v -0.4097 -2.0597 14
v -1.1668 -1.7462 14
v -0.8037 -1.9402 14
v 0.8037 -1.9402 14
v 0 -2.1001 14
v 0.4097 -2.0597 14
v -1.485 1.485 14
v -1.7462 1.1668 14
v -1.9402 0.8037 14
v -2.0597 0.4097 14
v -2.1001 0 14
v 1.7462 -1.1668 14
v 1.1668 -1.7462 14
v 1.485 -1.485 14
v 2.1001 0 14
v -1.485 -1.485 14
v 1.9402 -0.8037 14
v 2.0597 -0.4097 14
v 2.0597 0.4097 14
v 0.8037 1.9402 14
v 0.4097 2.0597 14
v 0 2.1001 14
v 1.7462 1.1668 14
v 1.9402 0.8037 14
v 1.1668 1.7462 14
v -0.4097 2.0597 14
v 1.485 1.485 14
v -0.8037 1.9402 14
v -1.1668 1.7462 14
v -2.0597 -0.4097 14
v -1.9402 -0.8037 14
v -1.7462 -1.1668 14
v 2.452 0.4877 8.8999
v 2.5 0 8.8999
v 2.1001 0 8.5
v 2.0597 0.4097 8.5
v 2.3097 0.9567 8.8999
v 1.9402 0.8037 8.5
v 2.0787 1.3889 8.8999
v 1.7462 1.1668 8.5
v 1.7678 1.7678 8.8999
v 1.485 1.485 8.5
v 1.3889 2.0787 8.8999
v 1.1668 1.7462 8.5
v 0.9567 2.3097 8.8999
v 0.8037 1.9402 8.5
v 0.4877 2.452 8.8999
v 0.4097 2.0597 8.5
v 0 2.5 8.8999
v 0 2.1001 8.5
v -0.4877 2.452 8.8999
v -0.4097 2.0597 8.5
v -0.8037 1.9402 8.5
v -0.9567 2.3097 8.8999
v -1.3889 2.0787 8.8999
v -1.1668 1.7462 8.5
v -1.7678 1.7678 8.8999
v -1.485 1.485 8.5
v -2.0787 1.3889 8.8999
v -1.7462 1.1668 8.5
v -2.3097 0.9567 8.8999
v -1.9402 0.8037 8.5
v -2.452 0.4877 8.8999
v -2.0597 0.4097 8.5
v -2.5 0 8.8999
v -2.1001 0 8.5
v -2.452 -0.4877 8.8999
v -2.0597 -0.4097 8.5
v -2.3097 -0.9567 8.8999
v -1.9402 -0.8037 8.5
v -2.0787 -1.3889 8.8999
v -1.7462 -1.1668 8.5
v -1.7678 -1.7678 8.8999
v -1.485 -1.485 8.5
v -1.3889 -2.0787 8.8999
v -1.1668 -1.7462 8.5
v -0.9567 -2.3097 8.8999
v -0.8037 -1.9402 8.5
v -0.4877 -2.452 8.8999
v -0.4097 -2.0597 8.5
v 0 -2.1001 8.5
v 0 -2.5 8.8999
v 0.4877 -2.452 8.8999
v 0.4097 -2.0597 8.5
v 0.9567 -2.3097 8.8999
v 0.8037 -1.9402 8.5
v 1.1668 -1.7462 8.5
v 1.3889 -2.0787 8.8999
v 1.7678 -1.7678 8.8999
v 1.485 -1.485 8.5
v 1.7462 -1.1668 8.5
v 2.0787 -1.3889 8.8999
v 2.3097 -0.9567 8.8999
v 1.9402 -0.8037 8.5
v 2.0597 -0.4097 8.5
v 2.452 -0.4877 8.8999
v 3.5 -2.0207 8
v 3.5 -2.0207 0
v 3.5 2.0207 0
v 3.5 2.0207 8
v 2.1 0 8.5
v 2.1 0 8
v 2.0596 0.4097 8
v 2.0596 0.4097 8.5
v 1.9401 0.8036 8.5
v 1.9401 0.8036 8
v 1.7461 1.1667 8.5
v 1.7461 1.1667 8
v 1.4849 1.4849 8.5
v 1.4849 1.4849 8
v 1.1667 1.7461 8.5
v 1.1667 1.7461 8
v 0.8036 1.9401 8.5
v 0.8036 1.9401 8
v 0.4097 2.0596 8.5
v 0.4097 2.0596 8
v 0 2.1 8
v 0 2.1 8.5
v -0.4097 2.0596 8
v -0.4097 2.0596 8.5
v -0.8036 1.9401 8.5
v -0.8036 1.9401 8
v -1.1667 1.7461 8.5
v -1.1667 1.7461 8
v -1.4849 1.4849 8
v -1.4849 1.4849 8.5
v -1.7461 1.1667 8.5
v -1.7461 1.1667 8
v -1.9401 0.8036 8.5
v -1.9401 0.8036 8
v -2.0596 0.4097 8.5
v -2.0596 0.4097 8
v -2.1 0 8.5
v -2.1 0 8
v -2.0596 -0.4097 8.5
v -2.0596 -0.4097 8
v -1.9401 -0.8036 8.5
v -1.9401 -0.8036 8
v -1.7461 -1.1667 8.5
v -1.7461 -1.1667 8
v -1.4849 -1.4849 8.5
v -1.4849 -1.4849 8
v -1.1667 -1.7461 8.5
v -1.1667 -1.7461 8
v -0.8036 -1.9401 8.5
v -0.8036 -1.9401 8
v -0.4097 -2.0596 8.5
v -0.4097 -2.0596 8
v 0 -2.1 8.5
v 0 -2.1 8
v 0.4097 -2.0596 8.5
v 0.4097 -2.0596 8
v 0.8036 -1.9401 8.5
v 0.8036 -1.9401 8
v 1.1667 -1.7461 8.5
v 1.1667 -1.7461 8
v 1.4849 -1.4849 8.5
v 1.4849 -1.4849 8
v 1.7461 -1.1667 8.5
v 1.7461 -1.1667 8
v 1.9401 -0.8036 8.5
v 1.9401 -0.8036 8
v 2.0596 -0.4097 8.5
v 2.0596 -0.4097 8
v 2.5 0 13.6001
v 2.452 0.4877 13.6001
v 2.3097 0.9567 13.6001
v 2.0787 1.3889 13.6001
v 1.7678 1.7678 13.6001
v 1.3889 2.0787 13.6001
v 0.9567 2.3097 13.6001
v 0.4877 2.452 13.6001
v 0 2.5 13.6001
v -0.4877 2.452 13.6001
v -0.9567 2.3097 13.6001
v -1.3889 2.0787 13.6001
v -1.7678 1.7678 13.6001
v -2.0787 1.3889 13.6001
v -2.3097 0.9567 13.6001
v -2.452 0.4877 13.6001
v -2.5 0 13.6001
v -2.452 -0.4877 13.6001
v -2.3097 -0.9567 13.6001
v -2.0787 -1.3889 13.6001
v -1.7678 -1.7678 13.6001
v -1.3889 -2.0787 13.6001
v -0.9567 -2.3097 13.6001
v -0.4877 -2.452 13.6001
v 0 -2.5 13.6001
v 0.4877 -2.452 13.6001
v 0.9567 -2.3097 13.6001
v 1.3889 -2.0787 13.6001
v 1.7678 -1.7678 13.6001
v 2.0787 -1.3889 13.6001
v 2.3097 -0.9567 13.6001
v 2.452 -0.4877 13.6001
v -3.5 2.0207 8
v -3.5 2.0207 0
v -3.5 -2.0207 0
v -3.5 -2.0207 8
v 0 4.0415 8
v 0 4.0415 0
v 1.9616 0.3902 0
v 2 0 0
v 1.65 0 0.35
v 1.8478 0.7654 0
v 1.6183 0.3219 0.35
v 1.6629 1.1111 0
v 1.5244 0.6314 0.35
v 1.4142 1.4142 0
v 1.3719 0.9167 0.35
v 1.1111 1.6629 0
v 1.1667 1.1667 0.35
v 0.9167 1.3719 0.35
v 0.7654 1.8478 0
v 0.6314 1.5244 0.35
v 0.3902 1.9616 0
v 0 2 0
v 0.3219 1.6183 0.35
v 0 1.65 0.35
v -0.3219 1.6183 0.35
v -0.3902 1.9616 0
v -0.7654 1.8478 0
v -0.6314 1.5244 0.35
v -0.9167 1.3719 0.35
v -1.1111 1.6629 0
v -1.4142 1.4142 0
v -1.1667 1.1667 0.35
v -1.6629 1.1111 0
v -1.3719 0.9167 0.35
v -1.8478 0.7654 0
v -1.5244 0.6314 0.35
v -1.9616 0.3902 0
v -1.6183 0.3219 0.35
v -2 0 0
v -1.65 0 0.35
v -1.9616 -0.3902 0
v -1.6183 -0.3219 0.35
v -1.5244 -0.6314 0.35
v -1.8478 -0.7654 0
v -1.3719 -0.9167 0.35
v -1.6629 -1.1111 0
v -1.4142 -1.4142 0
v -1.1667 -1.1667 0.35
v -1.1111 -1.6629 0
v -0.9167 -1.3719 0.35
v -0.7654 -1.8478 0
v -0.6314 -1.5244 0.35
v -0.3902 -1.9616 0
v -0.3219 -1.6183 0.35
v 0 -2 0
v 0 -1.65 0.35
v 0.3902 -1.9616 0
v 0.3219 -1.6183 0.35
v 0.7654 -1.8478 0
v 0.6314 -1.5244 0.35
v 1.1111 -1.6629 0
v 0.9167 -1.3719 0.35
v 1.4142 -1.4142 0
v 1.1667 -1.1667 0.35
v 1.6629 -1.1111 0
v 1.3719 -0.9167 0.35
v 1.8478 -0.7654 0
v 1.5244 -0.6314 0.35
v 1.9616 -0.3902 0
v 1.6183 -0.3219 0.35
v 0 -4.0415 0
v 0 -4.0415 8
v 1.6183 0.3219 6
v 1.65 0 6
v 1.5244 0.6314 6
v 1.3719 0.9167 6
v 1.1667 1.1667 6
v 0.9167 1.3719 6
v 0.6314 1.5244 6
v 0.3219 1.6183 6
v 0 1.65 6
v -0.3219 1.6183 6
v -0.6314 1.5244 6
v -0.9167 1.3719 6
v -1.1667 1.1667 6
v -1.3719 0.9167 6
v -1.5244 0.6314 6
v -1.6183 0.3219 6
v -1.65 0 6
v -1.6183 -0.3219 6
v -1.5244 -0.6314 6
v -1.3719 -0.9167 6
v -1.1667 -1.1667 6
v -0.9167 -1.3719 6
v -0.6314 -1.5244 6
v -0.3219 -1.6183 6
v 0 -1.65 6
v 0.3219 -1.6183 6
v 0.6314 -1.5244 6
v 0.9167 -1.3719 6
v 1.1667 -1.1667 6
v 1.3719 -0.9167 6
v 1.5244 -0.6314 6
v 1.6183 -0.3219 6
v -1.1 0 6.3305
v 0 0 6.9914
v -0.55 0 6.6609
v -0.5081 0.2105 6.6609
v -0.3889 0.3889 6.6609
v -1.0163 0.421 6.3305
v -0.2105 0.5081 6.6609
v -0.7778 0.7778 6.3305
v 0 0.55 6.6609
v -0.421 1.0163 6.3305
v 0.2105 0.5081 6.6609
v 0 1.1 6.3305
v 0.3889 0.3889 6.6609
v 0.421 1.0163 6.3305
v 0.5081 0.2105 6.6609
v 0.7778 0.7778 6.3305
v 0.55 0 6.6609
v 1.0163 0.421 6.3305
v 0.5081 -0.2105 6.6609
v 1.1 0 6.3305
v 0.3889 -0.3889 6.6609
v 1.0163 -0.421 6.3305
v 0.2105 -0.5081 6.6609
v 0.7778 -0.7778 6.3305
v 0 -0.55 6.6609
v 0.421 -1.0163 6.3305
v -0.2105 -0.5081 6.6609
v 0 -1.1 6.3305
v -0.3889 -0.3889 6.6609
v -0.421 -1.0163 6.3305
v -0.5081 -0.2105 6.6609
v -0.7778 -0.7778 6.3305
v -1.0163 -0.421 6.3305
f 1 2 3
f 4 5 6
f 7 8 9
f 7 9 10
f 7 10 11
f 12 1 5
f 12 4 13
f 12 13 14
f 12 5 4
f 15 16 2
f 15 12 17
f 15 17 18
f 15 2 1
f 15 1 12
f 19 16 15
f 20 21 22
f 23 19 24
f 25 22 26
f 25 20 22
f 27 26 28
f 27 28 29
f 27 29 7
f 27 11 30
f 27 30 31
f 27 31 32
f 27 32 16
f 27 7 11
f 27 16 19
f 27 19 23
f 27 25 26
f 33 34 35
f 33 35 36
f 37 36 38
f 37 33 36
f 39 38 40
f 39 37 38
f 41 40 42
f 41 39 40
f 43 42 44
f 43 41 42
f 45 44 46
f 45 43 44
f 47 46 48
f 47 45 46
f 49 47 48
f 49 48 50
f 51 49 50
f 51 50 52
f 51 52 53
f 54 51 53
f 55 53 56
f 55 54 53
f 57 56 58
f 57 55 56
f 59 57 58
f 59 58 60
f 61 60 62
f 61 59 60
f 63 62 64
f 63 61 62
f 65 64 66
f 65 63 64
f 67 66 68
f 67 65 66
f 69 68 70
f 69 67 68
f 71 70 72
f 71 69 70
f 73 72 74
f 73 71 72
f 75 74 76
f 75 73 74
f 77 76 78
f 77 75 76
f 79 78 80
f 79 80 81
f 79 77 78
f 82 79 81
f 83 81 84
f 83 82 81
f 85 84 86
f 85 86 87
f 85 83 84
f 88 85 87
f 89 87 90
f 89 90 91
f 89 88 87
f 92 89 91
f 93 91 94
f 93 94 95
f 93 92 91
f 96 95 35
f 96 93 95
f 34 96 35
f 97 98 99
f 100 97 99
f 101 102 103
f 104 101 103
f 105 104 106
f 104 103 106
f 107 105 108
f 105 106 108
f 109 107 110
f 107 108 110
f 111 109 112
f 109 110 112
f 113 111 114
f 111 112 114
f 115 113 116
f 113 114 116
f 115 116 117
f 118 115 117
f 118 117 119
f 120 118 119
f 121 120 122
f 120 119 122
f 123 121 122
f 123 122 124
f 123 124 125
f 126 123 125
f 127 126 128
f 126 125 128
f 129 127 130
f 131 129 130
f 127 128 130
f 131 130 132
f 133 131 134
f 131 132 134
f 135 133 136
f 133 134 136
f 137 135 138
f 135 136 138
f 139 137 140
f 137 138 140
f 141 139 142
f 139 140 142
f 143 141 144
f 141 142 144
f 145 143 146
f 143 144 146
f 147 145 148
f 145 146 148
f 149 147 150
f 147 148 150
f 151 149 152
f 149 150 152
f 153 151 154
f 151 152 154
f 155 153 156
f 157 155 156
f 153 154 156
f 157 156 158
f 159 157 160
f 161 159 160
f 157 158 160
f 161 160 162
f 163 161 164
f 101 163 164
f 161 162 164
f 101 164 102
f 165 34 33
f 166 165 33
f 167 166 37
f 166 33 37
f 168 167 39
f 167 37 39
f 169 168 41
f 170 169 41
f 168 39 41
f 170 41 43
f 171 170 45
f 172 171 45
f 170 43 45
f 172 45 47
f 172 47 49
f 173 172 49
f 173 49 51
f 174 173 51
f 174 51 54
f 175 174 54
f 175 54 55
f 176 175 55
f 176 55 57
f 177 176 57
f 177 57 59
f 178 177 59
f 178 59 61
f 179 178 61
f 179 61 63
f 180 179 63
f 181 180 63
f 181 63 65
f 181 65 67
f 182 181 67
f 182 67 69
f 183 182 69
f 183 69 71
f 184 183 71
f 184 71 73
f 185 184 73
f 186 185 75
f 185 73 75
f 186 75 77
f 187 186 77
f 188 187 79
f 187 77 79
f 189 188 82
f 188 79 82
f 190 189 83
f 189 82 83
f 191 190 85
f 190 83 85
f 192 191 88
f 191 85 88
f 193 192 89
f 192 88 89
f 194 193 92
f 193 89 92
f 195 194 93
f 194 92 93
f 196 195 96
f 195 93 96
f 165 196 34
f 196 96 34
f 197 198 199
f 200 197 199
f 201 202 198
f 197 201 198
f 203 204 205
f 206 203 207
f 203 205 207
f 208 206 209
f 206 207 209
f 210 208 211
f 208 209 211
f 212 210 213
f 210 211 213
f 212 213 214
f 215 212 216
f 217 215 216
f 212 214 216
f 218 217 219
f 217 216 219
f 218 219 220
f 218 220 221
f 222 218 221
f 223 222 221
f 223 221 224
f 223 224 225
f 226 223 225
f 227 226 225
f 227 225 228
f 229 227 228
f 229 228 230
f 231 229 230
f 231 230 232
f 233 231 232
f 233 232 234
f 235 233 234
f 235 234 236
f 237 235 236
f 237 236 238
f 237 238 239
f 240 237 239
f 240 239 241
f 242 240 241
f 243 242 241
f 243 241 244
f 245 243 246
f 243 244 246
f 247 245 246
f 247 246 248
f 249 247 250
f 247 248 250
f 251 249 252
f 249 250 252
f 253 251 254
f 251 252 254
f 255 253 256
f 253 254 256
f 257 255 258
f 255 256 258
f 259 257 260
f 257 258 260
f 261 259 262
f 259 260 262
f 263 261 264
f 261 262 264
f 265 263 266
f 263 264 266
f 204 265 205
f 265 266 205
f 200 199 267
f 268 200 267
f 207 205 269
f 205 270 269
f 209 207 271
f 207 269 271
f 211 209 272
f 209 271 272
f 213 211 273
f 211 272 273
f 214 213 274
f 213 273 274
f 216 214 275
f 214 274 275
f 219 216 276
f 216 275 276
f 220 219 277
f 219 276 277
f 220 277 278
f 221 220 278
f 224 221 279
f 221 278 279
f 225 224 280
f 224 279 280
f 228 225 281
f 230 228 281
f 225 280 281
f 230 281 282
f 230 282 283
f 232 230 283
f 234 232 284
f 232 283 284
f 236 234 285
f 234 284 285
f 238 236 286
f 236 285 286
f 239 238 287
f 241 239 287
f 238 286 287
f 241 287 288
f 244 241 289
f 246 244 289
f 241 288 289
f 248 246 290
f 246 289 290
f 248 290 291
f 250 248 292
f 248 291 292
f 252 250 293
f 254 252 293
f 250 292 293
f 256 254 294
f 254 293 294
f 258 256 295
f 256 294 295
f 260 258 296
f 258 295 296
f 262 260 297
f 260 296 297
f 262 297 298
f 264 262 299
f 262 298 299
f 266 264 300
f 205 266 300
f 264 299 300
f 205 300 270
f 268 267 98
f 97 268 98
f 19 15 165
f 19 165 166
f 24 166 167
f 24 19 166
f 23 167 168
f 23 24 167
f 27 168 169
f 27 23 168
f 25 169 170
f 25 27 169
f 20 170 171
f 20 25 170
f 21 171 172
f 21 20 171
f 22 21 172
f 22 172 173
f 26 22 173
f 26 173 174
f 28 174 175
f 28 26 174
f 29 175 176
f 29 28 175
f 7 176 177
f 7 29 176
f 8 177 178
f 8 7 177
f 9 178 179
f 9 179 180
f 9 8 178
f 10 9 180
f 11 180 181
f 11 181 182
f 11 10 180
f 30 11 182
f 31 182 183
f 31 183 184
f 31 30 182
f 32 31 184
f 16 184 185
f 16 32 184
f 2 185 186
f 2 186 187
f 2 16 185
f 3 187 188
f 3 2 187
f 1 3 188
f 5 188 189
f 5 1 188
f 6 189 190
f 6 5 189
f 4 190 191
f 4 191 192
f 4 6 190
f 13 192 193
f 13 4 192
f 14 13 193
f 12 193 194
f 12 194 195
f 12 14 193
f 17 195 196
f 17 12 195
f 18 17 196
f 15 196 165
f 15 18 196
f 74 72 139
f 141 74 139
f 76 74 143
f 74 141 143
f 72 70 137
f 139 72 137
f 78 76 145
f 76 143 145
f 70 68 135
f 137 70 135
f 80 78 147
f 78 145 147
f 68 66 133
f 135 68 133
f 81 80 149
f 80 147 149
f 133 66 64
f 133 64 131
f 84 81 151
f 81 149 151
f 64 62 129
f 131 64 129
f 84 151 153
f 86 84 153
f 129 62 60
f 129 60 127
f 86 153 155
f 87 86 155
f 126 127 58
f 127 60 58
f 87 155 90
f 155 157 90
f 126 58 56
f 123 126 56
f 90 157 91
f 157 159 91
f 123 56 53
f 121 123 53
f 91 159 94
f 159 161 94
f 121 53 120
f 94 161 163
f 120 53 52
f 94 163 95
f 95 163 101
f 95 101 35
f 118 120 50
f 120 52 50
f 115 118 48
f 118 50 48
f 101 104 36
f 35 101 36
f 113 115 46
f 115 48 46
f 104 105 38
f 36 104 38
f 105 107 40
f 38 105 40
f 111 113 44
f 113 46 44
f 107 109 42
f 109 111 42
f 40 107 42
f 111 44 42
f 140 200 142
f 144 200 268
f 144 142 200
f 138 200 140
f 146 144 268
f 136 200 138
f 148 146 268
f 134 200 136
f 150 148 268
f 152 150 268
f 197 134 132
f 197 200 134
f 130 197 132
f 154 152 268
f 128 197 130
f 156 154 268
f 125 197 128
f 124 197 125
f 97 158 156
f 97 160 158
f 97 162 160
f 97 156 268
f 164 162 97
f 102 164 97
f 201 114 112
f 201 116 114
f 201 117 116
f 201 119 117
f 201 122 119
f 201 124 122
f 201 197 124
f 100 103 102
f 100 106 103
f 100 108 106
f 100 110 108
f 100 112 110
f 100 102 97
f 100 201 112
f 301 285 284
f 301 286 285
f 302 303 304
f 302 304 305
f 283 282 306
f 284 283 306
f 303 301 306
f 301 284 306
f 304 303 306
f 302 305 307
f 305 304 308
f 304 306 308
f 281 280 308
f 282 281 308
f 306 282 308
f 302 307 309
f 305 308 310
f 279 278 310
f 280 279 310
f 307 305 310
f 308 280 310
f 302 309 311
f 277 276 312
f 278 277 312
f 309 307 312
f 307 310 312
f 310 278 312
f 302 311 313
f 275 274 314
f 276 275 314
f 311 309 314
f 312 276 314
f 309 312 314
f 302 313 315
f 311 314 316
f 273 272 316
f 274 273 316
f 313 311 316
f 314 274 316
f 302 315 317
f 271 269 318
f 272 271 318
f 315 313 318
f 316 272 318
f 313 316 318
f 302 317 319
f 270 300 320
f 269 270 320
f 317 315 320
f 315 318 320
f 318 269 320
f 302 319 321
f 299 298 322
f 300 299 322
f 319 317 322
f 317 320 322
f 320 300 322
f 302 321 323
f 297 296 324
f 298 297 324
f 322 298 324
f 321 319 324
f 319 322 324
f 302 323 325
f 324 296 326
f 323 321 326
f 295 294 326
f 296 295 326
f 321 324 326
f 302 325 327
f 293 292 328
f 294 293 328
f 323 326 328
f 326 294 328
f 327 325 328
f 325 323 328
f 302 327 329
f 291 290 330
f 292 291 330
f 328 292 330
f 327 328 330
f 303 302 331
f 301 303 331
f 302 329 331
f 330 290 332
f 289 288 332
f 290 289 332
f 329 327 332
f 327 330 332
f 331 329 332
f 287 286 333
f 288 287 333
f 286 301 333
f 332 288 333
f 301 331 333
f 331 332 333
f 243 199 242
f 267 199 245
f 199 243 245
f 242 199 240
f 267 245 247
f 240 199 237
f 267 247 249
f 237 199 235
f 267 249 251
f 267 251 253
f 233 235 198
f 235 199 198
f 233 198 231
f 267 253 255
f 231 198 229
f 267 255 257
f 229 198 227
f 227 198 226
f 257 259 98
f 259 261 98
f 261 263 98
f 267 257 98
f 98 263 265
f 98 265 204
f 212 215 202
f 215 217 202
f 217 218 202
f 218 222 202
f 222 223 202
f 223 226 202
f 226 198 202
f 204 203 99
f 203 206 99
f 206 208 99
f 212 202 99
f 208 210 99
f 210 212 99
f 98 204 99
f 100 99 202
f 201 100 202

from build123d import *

# Parameters (mm, degrees)
EXTRUDE_1_DEPTH             = 8
SKETCH_2_R                  = 2.5
EXTRUDE_2_DEPTH             = 6
SKETCH_3_R                  = 2.5
SKETCH_3_R_2                = 2.1
CUT_EXTRUDE_3_DEPTH         = 0.5
CHAMFER_1_SIZE              = 0.4
HOLE_WIZARD_M41_D           = 3.3
HOLE_WIZARD_M41_DEPTH       = 6
HOLE_WIZARD_M41_CSINK_D     = 4
HOLE_WIZARD_M41_CSINK_ANGLE = 90
HOLE_WIZARD_M41_TIP         = 0.991420021


with BuildPart() as part:
    # Эскиз1 → Вытянуть1 (new body)
    with BuildSketch(Plane.XY):
        Polygon((0, 4.041451884), (-3.5, 2.020725942), (-3.5, -2.020725942), (0, -4.041451884), (3.5, -2.020725942), (3.5, 2.020725942), align=None)
    extrude(amount=EXTRUDE_1_DEPTH)

    # Эскиз2 → Вытянуть2 (add)
    with BuildSketch(Plane.XY.offset(8)):
        Circle(SKETCH_2_R)
    extrude(amount=EXTRUDE_2_DEPTH)

    # Эскиз3 → Вырез-Вытянуть3 (cut)
    with BuildSketch(Plane.XY.offset(8)):
        Circle(SKETCH_3_R)
        Circle(SKETCH_3_R_2, mode=Mode.SUBTRACT)
    extrude(amount=CUT_EXTRUDE_3_DEPTH, mode=Mode.SUBTRACT)

    # Фаска1
    chamfer_1_edges = [part.edges().sort_by_distance(p)[0] for p in [
        (-2.5, 0, 8.5),
        (-2.5, 0, 14),
    ]]
    chamfer(chamfer_1_edges, length=CHAMFER_1_SIZE - 0.0001)  # a hair under: the kernel refuses the full size

    # Отверстие с зазором M41
    with Locations(Plane(origin=(0, 0, 0), x_dir=(-1, 0, 0), z_dir=(0, 0, -1))):
        with Locations((0, 0)):
            CounterSinkHole(HOLE_WIZARD_M41_D / 2, HOLE_WIZARD_M41_CSINK_D / 2, depth=HOLE_WIZARD_M41_DEPTH, counter_sink_angle=HOLE_WIZARD_M41_CSINK_ANGLE)
            with Locations((0, 0, -(HOLE_WIZARD_M41_DEPTH + HOLE_WIZARD_M41_TIP / 2))):  # 118° drill point
                Cone(0, HOLE_WIZARD_M41_D / 2, HOLE_WIZARD_M41_TIP, mode=Mode.SUBTRACT)


solid = part.part
